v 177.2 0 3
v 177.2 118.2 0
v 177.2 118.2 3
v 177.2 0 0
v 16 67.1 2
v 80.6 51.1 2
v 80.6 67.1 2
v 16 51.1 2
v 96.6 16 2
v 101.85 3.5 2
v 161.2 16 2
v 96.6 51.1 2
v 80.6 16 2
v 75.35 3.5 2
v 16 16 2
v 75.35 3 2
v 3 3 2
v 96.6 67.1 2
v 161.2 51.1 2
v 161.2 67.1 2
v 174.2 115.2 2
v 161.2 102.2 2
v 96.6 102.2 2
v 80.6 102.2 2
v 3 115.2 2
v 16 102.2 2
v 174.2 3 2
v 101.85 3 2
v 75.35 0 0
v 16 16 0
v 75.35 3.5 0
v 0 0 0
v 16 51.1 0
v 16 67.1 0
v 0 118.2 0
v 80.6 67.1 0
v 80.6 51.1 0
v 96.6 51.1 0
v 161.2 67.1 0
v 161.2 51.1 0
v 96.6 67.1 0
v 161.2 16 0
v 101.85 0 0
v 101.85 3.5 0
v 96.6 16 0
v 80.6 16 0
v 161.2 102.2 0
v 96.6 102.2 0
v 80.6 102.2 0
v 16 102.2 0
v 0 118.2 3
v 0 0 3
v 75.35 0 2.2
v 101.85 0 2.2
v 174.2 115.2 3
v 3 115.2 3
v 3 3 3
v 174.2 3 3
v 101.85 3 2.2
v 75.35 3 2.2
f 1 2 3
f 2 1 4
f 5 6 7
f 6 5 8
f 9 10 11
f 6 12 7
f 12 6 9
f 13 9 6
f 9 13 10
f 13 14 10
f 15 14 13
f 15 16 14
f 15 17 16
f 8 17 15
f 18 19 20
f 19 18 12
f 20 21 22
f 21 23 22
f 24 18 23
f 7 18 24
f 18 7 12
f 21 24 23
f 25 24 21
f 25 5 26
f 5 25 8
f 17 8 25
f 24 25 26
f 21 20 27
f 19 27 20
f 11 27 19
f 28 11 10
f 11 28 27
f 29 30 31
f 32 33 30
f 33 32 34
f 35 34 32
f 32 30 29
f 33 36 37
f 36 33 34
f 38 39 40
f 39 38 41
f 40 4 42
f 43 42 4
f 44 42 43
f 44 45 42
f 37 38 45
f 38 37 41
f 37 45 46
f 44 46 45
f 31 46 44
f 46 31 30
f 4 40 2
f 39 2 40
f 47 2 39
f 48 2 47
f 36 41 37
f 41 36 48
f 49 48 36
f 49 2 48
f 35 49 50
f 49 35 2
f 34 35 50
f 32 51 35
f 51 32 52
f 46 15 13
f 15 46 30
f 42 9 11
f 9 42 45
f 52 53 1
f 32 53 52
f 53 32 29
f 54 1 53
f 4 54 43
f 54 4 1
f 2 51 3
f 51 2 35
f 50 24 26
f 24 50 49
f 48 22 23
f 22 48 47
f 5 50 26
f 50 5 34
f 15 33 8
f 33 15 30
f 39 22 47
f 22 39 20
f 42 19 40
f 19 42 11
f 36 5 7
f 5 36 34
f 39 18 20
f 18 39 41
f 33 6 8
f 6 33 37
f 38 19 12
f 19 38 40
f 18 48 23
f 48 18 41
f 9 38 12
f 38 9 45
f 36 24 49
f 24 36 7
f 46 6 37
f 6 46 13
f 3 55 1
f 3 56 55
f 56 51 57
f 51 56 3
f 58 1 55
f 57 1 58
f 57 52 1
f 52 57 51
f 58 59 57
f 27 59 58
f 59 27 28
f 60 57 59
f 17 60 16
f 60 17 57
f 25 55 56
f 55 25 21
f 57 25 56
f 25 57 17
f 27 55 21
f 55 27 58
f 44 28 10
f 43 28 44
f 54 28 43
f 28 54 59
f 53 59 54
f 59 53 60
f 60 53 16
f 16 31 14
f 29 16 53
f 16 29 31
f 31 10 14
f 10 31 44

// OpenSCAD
// file: part-06.scad
include	<../common/constants.scad>
use <common.scad>
use <part-01.scad>
use <part-02.scad>
use <part-03.scad>

//	그룹 of part1, part2, part3
function PART06() = [PART02().x, PART02().y + PART03().y, PART02().z];
function MARGIN06() = [0, -PART03().y, 0];

module epaper_part_06() {
	translate([MARGIN02().x, (PART02().y - PART01().y) - MARGIN02().y, PART02().z])
	epaper_part_01();
	
	epaper_part_02();

	translate([MARGIN03().x, -PART03().y, 0])
	epaper_part_03();
	
	%
	color("white")
	translate([0, -2.2, 0])
	linear_extrude(height = EPSILON) {
		text(str("⑥ = ①+②+③"), font = "D2Coding", size = 2);
	}
}

module background_06() {
}

module main() {
	%background_06();
	epaper_part_06();
}

main();
// file: part-03.scad
include	<../common/constants.scad>
use <common.scad>
use <part-01.scad>
use <part-02.scad>

function PART03() = [25.50, 24.00, 0.1];
function PADDING03() = [3, 3, 1];
function MARGIN03() = [72.35, 0, 0];

SIZE = [0, 0, 2];
PADDING = [3, 3, 1];
MARGIN = [0.5, 0.5];
COLOR = [0.4, 0.8, 0.4, 0.5];

part01 = PART01();
part02 = PART02();
margin02 = MARGIN02();
part03 = PART03();
part04 = PART04();

function PART04() = [
	PADDING.x * 2 + MARGIN.x * 2 + PART02().x,
	PADDING.y * 2 + MARGIN.y * 2 + PART02().y,
	SIZE.z + PADDING.z
];
function MARGIN04() = [PADDING.x + MARGIN.x, PADDING.y + MARGIN.y, SIZE.z + PADDING.z];

module epaper_part_03() {
	s = PART03();
	m = MARGIN03();
	
	color(COLOR)
	cube(PART03());

	%color("white")
	translate([1, s.y - 4, PART03().z])
	linear_extrude(height = PART03().z + EPSILON) {
		text("3. Connector", size = 2);

		translate([2, -3])
		text(str(s.x, " x ", s.y, " x 0.1", "mm"), size = 2);
	}

	//	가로
	translate([0, 2, PART03().z])
	notate([PART03().x, 2]);
	//	세로
	translate([PART03().x - 4, 0, PART03().z])
	notate([2, PART03().y]);
}

module epaper_display_part_03() {
	s = PART03();
	m = MARGIN03();
	
	translate(m)
	{
		epaper_part_03();
	}
}

module background_03() {
	translate([0, PART03().y, 0])
	epaper_display_part_02();
}

module main() {
	%background_03();
	epaper_display_part_03();
}

epaper_display_part_03();
!epaper_part_03();
// file: part-02.scad
// 라이브러리, 검증된 것만 이곳에
include	<../common/constants.scad>
use <common.scad>
use <part-01.scad>

function PART02() = [170.20, 111.20, 0.91];
function MARGIN02() = [5.10, 4.70];
COLOR02 = [0.5, 0.5, 0.1, 0.9];

module epaper_part_02() {
	s = PART02();
	m = MARGIN02();

	//	Panel
	color(COLOR02)
	cube(s);

	pNotate = [m.x + PART01().x - 8, (s.y - 8) - m.y];

	//	왼쪽 테두리
	translate([0, pNotate.y, PART02().z])
	notate([MARGIN02().x, 2], str(MARGIN02().x, "mm"));

	//	오른쪽 테두리
	translate([pNotate.x + 8, pNotate.y, PART02().z])
	notate([MARGIN02().x, 2], str(MARGIN02().x, "mm"));

	//	위쪽 테두리
	translate([pNotate.x, PART02().y - MARGIN02().y, PART02().z])
	notate([2, MARGIN02().y]);

	//	아래쪽 테두리
	translate([pNotate.x, 0, PART02().z])
	notate([2, PART02().y - PART01().y - MARGIN02().y]);

	%translate([2, s.y - 4, EPSILON])
	color("black")
	linear_extrude(height = s.z) {
		text(str("2. Panel: (", s.x, " x ", s.y, " x ", s.z, "mm), "), size = 2);
	}
}
module epaper_display_part_02() {
	s = PART02();
	m = MARGIN02();

	//	Active Area
	translate([m.x, (s.y - PART01().y) - m.y, s.z])
	epaper_display_part_01();

	epaper_part_02();
}

epaper_display_part_02();
!epaper_part_02();
// file: part-01.scad
// 라이브러리, 검증된 것만 이곳에
include	<../common/constants.scad>
use	<common.scad>

// active area
ACTIVE_AREA_COLOR = [0.3, 0.3, 0.9, 0.9];
function PART01() = [160.00, 96.00, EPSILON];

module epaper_part_01() {
	s = PART01();

	color(ACTIVE_AREA_COLOR)
	cube(s);
	
	translate([0, s.y - 8, s.z])
	notate([s.x, 2]);

	translate([s.x - 8, 0, s.z])
	notate([2, s.y]);

	%translate([2, s.y - 4, EPSILON * 2])
	linear_extrude(height = s.z) {
		text(str("1. Active Area: ", s.x, " x ", s.y, "mm"), font = "D2Coding", size = 2);
	}
}
module epaper_display_part_01() {
	epaper_part_01();
}

epaper_display_part_01();
// file: common.scad
include	<../common/constants.scad>

// A(x0, y0), B(x1, y1), C(x2, y2) 에서 A와 직선 BC 사이 거리 계산
function pointToLineDistance(x0, y0, x1, y1, x2, y2) =
    abs((x2 - x1)*(y1 - y0) - (x1 - x0)*(y2 - y1)) /
    sqrt((x2 - x1)*(x2 - x1) + (y2 - y1)*(y2 - y1));

module HR() {
		echo("_________________________________________________________________________________");
}
module arrow_left(v) {
	leader = v.y / 32;	//	지시선 두께
	polygon([
		[0, 0],
		[leader, 0],
		[leader, v.y],
		[0, v.y]
	]);

	shaft = v.y / 24;	//	화살대 두께
	polygon([
		[0,		v.y / 2],
		[v.y,	0],
		[v.y,	v.y / 2 - shaft],
		[v.y,	v.y / 2 + shaft],
		[v.y,	v.y],

		[v.x,	v.y / 2 - shaft],
		[v.x,	v.y / 2 + shaft]
	],
	paths=[[0, 1, 2, 5, 6, 3, 4]]);
}
module arrow_right(v) {
	translate(v)
	rotate([0, 0, 180])
	arrow_left(v);
}
module arrow_up(v) {
	translate([0, v.y])
	rotate([0, 0, -90])
	arrow_left([v.y, v.x]);
}
module arrow_down(v) {
	translate([v.x, 0])
	rotate([0, 0, 90])
	arrow_left([v.y, v.x]);
}

module notateHI(v, title) {
	titleSize = v.y * len(title);

	arrow_left([(v.x - titleSize) / 2, v.y]);

	translate([v.x - (v.x - titleSize) / 2, 0])
	arrow_right([(v.x - titleSize) / 2, v.y]);

	translate([(v.x - titleSize) / 2, 0])
	text(title, font = "D2Coding", size = v.y);
}
module notateHO(v, title) {
	titleSize = v.y * len(title);
	arrowSize = v.y * 3;

	translate([-arrowSize, 0])
	arrow_right([arrowSize, v.y]);

	translate([v.x, 0])
	arrow_left([arrowSize, v.y]);

	translate([(v.x - titleSize) / 2, 0])
	text(title, font = "D2Coding", size = v.y);
}
module notateH(v, title, up, prefix) {
	prefixSafe = is_undef(prefix) ? "" : prefix;
	titleDetail = is_undef(title) ? str(prefixSafe, v.x, "mm") : title;
	titleShort = is_undef(title) ? str(prefixSafe, v.x) : title;
	titleDetailSize = v.y * len(titleDetail);
	titleShortSize = v.y * len(titleShort);
	
	arrowSize = v.y * 3;

	titleSafe = is_undef(title) ? str(v.x) : title;
	upSafe = is_undef(up) ? true : false;
	%linear_extrude(height = EPSILON) {
		if (v.x >= (arrowSize * 2 + titleDetailSize)) {
			// 화살표, 단위까지 충분히 들어간다
			notateHI(v, titleDetail);
		} else if (v.x >= (arrowSize * 2 + titleShortSize)) {
			// 화살표는 들어갈 수 있으나, 단위까지는 못 들어간다
			notateHI(v, titleShort);
		} else if (v.x >= titleDetailSize) {
			//	화살표는 못들어가나, 단위는 들어간다
			notateHO(v, titleDetail);
		} else if (v.x >= titleShortSize) {
			//	화살표는 못들어가나, 수치는 들어간다
			notateHO(v, titleShort);
		} else {
			// 바깥에 표시해야 한다
			notateHO(v, "");
			if (upSafe) {
				translate([(v.x - titleDetailSize) / 2, v.y])
				text(titleDetail, font = "D2Coding", size = v.y);
			} else {
				translate([(v.x - titleDetailSize) / 2, -v.y])
				text(titleDetail, font = "D2Coding", size = v.y);
			}
		}
	}
}
module notateV(v, title, up, prefix) {
	translate([v.x, 0])
	rotate([0, 0, 90])
	notateH([v.y, v.x], title, up, prefix);
}
module notate(v, title, up, prefix) {
	if (v.x > v.y) {
		notateH(v, title, up, prefix);
	} else {
		notateV(v, title, up, prefix);
	}
}
module test() {
	// 테스트
	x0 = 2; y0 = 2;    // 점 A
	x1 = 0; y1 = 0;    // 점 B
	x2 = 4; y2 = 0;    // 점 C

	distance = pointToLineDistance(x0, y0, x1, y1, x2, y2);
	HR();
	echo("A에서 BC까지의 거리: ", distance);
	HR();
}
module main() {
	SHORT = 20;
	//notate([32, 16], str(32, "mm"));
	//notateH([3, 4]);
	notate([13, 4]);
	arrow_left([8, 2]);

	test();
}

main();
// file: ../common/constants.scad
// 상수들 정의
// include 사용하시오
MAX = [220, 220, 250];
ZERO = [0, 0, 0];
HALF = [1/2, 1/2, 1/2];
ONE = [1, 1, 1];
BIG = [1024, 1024, 1024];
EPSILON = 0.01;
EPSILON2 = EPSILON * 2;
MINIMUM = 0.1;	//	0.1mm
NOZZLE = 0.4;	//	노즐 지름
OVERHANG_THRESHOLD = 30;

FN = $preview ? 16 : 360;

//	자원들
RADIUS_HOLE_NUT_25 = 3.4 / 2;	//	검은색 25mm 나사 너트 구멍 반지름
// main file
include	<../common/constants.scad>
use <common.scad>
use <part-01.scad>
use <part-02.scad>
use <part-03.scad>
use <part-06.scad>

//	①②③④⑤⑥⑦⑧⑨ⒶⒷⒸⒹⒺⒻⒼⒽⒾⒿⓀⓐⓑⓒⓓⓔⓕⓖⓗⓘⓙⓚⓛⓜⓝ
ID = "④";
SIZE = [0, 0, 2];
PADDING = [3, 3, 1];
PADDING_INNER = [16, 16];	//	밑판 최외곽 너비
MARGIN = [0.5, 0.5, 0.2];
COLOR = [0.8, 0.4, 0.3, 1];

function PART04() = [
	PADDING.x * 2 + MARGIN.x * 2 + PART02().x,
	PADDING.y * 2 + MARGIN.y * 2 + PART02().y,
	SIZE.z + PADDING.z
];
function MARGIN04() = [0, 0, 0];

pNotate = [PART04().x - PADDING_INNER.x - 16, PADDING_INNER.y + 16];

//	밑판
module epaper_display_part_04_01() {
	size = [
		PADDING.x * 2 + MARGIN.x * 2 + PART02().x,
		PADDING.y * 2 + MARGIN.y * 2 + PART02().y,
		SIZE.z
	];

	//	아래쪽
	color(COLOR)
	translate([0, 0, 0])
	cube([size.x, PADDING_INNER.y, size.z]);
	translate([pNotate.x - 2, 0, PART04().z])
	notate([1.5, PADDING.y]);
	translate([pNotate.x - 2, PADDING.y, PART04().z])
	notate([1.5, PADDING_INNER.y - PADDING.y]);
	translate([pNotate.x, 0, PART04().z])
	notate([2, PADDING_INNER.y]);

	//	위쪽
	color(COLOR)
	translate([0, size.y - PADDING_INNER.y, 0])
	cube([size.x, PADDING_INNER.y, size.z]);
	translate([pNotate.x - 2, size.y - PADDING.y, PART04().z])
	notate([1.5, PADDING.y]);
	translate([pNotate.x - 2, size.y - PADDING_INNER.y, PART04().z])
	notate([1.5, PADDING_INNER.y - PADDING.y]);
	translate([pNotate.x, size.y - PADDING_INNER.y, PART04().z])
	notate([2, PADDING_INNER.y]);

	//	가운데
	translate([pNotate.x, PADDING_INNER.y, PART04().z])
	notate([2, PART04().y - PADDING_INNER.y * 2]);
	
	//	왼쪽
	color(COLOR)
	translate([0, PADDING_INNER.y, 0])
	cube([PADDING_INNER.x, size.y - PADDING_INNER.y * 2, size.z]);
	translate([0, pNotate.y + 2, PART04().z])
	notate([PADDING.x, 1.5]);
	translate([PADDING.x, pNotate.y + 2, PART04().z])
	notate([PADDING_INNER.x - PADDING.x, 1.5]);
	translate([0, pNotate.y, PART04().z])
	notate([PADDING_INNER.x, 2]);

	//	오른쪽
	color(COLOR)
	translate([size.x - PADDING_INNER.x, PADDING_INNER.y, 0])
	cube([PADDING_INNER.x, size.y - PADDING_INNER.y * 2, size.z]);
	translate([size.x - PADDING.x, pNotate.y + 2, PART04().z])
	notate([PADDING.x, 1.5]);
	translate([size.x - PADDING_INNER.x, pNotate.y + 2, PART04().z])
	notate([PADDING_INNER.x - PADDING.x, 1.5]);
	translate([size.x - PADDING_INNER.x, pNotate.y, PART04().z])
	notate([PADDING_INNER.x, 2]);

	//	가운데
	translate([PADDING_INNER.x, pNotate.y, PART04().z])
	notate([PART04().x - PADDING_INNER.x * 2, 2]);
	
	//	중앙 가로선
	color(COLOR)
	translate([PADDING_INNER.x, PART04().y / 2 - PADDING_INNER.y / 2, 0])
	cube([size.x - PADDING_INNER.x * 2, PADDING_INNER.y, size.z]);
	translate([pNotate.x - 2, (PART04().y - PADDING_INNER.y) / 2, PART04().z])
	notate([1.5, PADDING_INNER.y]);

	translate([pNotate.x - 2, size.y - PADDING.y, PART04().z])
	notate([1.5, PADDING.y]);

	//	중앙 세로선
	color(COLOR)
	translate([(PART04().x - PADDING_INNER.x) / 2, PADDING_INNER.y, 0])
	cube([PADDING_INNER.x, size.y - PADDING_INNER.y * 2, size.z]);
	translate([(PART04().x - PADDING_INNER.x) / 2, pNotate.y + 2, PART04().z])
	notate([PADDING_INNER.x, 1.5]);
}

module epaper_display_part_04_02() {
	v = PART02();
	s = [
		PADDING.x * 2 + MARGIN.x * 2 + v.x,
		PADDING.y * 2 + MARGIN.y * 2 + v.y,
		PART04().z
	];
	cdelta = 0.1;
	ccolor = [COLOR[0] - cdelta, COLOR[1] - cdelta, COLOR[2] - cdelta, COLOR[3]];

	// 아래
	translate([0, 0, SIZE.z])
	color(ccolor)
	cube([s.x, PADDING.y, PADDING.z]);

	//	아래 왼쪽
	translate([0, -3, 0])
	notate([PADDING.x + MARGIN03().x, 2], up = false);

	//	아래 오른쪽
	translate([PADDING.x + MARGIN03().x + PART03().x + MARGIN.x * 2, -3, 0])
	notate([PADDING.x + MARGIN03().x, 2], str(PADDING.x + MARGIN03().x, "mm"), false);

	//	위
	translate([0, PADDING.y + v.y + MARGIN.y * 2, SIZE.z])
	color(ccolor)
	cube([s.x, PADDING.y, PADDING.z]);

	//	왼쪽
	translate([0, PADDING.y, SIZE.z])
	color(ccolor)
	cube([PADDING.x, s.y - PADDING.y * 2, PADDING.z]);

	//	오른쪽
	translate([PADDING.x + v.x + MARGIN.x * 2, PADDING.y, SIZE.z])
	color(ccolor)
	cube([PADDING.x, s.y - PADDING.y * 2 , PADDING.z]);
}
//	아래쪽에 구멍내는 거, 연결선 빠져 나가는 구멍
module epaper_part_04_03() {
	size = [
		PART03().x + MARGIN.x * 2,
		PADDING.y + MARGIN.y + EPSILON,
		SIZE.z + MARGIN.z + EPSILON];

	translate([0, -EPSILON, -EPSILON])
	cube(size);

	translate([0, -3, -EPSILON])
	notate([size.x, 2]);
}
module background_04() {
	translate([-(PART02().x + PADDING.x + MARGIN.x), PADDING.y + MARGIN.y, 0])
	epaper_part_06();
}

module epaper_part_04() {
	m2 = MARGIN02();
	s3 = PART03();
	s4 = PART04();

	difference() {
		union() {
			epaper_display_part_04_01();
			epaper_display_part_04_02();
		}

		translate([PADDING.x + MARGIN03().x - MARGIN.x * 0, 0, 0])
		epaper_part_04_03();
	}

	%color("white")
	translate([2, PART04().y - 2.3, EPSILON])
	linear_extrude(height = PART04().z) {
		text(str(ID, " Cover: ", PART04().x, " x ", PART04().y, " x ", PART04().z, "mm"), font = "D2Coding", size = 2);
	}
}

module main() {
	%background_04();
	epaper_part_04();
}

main();
